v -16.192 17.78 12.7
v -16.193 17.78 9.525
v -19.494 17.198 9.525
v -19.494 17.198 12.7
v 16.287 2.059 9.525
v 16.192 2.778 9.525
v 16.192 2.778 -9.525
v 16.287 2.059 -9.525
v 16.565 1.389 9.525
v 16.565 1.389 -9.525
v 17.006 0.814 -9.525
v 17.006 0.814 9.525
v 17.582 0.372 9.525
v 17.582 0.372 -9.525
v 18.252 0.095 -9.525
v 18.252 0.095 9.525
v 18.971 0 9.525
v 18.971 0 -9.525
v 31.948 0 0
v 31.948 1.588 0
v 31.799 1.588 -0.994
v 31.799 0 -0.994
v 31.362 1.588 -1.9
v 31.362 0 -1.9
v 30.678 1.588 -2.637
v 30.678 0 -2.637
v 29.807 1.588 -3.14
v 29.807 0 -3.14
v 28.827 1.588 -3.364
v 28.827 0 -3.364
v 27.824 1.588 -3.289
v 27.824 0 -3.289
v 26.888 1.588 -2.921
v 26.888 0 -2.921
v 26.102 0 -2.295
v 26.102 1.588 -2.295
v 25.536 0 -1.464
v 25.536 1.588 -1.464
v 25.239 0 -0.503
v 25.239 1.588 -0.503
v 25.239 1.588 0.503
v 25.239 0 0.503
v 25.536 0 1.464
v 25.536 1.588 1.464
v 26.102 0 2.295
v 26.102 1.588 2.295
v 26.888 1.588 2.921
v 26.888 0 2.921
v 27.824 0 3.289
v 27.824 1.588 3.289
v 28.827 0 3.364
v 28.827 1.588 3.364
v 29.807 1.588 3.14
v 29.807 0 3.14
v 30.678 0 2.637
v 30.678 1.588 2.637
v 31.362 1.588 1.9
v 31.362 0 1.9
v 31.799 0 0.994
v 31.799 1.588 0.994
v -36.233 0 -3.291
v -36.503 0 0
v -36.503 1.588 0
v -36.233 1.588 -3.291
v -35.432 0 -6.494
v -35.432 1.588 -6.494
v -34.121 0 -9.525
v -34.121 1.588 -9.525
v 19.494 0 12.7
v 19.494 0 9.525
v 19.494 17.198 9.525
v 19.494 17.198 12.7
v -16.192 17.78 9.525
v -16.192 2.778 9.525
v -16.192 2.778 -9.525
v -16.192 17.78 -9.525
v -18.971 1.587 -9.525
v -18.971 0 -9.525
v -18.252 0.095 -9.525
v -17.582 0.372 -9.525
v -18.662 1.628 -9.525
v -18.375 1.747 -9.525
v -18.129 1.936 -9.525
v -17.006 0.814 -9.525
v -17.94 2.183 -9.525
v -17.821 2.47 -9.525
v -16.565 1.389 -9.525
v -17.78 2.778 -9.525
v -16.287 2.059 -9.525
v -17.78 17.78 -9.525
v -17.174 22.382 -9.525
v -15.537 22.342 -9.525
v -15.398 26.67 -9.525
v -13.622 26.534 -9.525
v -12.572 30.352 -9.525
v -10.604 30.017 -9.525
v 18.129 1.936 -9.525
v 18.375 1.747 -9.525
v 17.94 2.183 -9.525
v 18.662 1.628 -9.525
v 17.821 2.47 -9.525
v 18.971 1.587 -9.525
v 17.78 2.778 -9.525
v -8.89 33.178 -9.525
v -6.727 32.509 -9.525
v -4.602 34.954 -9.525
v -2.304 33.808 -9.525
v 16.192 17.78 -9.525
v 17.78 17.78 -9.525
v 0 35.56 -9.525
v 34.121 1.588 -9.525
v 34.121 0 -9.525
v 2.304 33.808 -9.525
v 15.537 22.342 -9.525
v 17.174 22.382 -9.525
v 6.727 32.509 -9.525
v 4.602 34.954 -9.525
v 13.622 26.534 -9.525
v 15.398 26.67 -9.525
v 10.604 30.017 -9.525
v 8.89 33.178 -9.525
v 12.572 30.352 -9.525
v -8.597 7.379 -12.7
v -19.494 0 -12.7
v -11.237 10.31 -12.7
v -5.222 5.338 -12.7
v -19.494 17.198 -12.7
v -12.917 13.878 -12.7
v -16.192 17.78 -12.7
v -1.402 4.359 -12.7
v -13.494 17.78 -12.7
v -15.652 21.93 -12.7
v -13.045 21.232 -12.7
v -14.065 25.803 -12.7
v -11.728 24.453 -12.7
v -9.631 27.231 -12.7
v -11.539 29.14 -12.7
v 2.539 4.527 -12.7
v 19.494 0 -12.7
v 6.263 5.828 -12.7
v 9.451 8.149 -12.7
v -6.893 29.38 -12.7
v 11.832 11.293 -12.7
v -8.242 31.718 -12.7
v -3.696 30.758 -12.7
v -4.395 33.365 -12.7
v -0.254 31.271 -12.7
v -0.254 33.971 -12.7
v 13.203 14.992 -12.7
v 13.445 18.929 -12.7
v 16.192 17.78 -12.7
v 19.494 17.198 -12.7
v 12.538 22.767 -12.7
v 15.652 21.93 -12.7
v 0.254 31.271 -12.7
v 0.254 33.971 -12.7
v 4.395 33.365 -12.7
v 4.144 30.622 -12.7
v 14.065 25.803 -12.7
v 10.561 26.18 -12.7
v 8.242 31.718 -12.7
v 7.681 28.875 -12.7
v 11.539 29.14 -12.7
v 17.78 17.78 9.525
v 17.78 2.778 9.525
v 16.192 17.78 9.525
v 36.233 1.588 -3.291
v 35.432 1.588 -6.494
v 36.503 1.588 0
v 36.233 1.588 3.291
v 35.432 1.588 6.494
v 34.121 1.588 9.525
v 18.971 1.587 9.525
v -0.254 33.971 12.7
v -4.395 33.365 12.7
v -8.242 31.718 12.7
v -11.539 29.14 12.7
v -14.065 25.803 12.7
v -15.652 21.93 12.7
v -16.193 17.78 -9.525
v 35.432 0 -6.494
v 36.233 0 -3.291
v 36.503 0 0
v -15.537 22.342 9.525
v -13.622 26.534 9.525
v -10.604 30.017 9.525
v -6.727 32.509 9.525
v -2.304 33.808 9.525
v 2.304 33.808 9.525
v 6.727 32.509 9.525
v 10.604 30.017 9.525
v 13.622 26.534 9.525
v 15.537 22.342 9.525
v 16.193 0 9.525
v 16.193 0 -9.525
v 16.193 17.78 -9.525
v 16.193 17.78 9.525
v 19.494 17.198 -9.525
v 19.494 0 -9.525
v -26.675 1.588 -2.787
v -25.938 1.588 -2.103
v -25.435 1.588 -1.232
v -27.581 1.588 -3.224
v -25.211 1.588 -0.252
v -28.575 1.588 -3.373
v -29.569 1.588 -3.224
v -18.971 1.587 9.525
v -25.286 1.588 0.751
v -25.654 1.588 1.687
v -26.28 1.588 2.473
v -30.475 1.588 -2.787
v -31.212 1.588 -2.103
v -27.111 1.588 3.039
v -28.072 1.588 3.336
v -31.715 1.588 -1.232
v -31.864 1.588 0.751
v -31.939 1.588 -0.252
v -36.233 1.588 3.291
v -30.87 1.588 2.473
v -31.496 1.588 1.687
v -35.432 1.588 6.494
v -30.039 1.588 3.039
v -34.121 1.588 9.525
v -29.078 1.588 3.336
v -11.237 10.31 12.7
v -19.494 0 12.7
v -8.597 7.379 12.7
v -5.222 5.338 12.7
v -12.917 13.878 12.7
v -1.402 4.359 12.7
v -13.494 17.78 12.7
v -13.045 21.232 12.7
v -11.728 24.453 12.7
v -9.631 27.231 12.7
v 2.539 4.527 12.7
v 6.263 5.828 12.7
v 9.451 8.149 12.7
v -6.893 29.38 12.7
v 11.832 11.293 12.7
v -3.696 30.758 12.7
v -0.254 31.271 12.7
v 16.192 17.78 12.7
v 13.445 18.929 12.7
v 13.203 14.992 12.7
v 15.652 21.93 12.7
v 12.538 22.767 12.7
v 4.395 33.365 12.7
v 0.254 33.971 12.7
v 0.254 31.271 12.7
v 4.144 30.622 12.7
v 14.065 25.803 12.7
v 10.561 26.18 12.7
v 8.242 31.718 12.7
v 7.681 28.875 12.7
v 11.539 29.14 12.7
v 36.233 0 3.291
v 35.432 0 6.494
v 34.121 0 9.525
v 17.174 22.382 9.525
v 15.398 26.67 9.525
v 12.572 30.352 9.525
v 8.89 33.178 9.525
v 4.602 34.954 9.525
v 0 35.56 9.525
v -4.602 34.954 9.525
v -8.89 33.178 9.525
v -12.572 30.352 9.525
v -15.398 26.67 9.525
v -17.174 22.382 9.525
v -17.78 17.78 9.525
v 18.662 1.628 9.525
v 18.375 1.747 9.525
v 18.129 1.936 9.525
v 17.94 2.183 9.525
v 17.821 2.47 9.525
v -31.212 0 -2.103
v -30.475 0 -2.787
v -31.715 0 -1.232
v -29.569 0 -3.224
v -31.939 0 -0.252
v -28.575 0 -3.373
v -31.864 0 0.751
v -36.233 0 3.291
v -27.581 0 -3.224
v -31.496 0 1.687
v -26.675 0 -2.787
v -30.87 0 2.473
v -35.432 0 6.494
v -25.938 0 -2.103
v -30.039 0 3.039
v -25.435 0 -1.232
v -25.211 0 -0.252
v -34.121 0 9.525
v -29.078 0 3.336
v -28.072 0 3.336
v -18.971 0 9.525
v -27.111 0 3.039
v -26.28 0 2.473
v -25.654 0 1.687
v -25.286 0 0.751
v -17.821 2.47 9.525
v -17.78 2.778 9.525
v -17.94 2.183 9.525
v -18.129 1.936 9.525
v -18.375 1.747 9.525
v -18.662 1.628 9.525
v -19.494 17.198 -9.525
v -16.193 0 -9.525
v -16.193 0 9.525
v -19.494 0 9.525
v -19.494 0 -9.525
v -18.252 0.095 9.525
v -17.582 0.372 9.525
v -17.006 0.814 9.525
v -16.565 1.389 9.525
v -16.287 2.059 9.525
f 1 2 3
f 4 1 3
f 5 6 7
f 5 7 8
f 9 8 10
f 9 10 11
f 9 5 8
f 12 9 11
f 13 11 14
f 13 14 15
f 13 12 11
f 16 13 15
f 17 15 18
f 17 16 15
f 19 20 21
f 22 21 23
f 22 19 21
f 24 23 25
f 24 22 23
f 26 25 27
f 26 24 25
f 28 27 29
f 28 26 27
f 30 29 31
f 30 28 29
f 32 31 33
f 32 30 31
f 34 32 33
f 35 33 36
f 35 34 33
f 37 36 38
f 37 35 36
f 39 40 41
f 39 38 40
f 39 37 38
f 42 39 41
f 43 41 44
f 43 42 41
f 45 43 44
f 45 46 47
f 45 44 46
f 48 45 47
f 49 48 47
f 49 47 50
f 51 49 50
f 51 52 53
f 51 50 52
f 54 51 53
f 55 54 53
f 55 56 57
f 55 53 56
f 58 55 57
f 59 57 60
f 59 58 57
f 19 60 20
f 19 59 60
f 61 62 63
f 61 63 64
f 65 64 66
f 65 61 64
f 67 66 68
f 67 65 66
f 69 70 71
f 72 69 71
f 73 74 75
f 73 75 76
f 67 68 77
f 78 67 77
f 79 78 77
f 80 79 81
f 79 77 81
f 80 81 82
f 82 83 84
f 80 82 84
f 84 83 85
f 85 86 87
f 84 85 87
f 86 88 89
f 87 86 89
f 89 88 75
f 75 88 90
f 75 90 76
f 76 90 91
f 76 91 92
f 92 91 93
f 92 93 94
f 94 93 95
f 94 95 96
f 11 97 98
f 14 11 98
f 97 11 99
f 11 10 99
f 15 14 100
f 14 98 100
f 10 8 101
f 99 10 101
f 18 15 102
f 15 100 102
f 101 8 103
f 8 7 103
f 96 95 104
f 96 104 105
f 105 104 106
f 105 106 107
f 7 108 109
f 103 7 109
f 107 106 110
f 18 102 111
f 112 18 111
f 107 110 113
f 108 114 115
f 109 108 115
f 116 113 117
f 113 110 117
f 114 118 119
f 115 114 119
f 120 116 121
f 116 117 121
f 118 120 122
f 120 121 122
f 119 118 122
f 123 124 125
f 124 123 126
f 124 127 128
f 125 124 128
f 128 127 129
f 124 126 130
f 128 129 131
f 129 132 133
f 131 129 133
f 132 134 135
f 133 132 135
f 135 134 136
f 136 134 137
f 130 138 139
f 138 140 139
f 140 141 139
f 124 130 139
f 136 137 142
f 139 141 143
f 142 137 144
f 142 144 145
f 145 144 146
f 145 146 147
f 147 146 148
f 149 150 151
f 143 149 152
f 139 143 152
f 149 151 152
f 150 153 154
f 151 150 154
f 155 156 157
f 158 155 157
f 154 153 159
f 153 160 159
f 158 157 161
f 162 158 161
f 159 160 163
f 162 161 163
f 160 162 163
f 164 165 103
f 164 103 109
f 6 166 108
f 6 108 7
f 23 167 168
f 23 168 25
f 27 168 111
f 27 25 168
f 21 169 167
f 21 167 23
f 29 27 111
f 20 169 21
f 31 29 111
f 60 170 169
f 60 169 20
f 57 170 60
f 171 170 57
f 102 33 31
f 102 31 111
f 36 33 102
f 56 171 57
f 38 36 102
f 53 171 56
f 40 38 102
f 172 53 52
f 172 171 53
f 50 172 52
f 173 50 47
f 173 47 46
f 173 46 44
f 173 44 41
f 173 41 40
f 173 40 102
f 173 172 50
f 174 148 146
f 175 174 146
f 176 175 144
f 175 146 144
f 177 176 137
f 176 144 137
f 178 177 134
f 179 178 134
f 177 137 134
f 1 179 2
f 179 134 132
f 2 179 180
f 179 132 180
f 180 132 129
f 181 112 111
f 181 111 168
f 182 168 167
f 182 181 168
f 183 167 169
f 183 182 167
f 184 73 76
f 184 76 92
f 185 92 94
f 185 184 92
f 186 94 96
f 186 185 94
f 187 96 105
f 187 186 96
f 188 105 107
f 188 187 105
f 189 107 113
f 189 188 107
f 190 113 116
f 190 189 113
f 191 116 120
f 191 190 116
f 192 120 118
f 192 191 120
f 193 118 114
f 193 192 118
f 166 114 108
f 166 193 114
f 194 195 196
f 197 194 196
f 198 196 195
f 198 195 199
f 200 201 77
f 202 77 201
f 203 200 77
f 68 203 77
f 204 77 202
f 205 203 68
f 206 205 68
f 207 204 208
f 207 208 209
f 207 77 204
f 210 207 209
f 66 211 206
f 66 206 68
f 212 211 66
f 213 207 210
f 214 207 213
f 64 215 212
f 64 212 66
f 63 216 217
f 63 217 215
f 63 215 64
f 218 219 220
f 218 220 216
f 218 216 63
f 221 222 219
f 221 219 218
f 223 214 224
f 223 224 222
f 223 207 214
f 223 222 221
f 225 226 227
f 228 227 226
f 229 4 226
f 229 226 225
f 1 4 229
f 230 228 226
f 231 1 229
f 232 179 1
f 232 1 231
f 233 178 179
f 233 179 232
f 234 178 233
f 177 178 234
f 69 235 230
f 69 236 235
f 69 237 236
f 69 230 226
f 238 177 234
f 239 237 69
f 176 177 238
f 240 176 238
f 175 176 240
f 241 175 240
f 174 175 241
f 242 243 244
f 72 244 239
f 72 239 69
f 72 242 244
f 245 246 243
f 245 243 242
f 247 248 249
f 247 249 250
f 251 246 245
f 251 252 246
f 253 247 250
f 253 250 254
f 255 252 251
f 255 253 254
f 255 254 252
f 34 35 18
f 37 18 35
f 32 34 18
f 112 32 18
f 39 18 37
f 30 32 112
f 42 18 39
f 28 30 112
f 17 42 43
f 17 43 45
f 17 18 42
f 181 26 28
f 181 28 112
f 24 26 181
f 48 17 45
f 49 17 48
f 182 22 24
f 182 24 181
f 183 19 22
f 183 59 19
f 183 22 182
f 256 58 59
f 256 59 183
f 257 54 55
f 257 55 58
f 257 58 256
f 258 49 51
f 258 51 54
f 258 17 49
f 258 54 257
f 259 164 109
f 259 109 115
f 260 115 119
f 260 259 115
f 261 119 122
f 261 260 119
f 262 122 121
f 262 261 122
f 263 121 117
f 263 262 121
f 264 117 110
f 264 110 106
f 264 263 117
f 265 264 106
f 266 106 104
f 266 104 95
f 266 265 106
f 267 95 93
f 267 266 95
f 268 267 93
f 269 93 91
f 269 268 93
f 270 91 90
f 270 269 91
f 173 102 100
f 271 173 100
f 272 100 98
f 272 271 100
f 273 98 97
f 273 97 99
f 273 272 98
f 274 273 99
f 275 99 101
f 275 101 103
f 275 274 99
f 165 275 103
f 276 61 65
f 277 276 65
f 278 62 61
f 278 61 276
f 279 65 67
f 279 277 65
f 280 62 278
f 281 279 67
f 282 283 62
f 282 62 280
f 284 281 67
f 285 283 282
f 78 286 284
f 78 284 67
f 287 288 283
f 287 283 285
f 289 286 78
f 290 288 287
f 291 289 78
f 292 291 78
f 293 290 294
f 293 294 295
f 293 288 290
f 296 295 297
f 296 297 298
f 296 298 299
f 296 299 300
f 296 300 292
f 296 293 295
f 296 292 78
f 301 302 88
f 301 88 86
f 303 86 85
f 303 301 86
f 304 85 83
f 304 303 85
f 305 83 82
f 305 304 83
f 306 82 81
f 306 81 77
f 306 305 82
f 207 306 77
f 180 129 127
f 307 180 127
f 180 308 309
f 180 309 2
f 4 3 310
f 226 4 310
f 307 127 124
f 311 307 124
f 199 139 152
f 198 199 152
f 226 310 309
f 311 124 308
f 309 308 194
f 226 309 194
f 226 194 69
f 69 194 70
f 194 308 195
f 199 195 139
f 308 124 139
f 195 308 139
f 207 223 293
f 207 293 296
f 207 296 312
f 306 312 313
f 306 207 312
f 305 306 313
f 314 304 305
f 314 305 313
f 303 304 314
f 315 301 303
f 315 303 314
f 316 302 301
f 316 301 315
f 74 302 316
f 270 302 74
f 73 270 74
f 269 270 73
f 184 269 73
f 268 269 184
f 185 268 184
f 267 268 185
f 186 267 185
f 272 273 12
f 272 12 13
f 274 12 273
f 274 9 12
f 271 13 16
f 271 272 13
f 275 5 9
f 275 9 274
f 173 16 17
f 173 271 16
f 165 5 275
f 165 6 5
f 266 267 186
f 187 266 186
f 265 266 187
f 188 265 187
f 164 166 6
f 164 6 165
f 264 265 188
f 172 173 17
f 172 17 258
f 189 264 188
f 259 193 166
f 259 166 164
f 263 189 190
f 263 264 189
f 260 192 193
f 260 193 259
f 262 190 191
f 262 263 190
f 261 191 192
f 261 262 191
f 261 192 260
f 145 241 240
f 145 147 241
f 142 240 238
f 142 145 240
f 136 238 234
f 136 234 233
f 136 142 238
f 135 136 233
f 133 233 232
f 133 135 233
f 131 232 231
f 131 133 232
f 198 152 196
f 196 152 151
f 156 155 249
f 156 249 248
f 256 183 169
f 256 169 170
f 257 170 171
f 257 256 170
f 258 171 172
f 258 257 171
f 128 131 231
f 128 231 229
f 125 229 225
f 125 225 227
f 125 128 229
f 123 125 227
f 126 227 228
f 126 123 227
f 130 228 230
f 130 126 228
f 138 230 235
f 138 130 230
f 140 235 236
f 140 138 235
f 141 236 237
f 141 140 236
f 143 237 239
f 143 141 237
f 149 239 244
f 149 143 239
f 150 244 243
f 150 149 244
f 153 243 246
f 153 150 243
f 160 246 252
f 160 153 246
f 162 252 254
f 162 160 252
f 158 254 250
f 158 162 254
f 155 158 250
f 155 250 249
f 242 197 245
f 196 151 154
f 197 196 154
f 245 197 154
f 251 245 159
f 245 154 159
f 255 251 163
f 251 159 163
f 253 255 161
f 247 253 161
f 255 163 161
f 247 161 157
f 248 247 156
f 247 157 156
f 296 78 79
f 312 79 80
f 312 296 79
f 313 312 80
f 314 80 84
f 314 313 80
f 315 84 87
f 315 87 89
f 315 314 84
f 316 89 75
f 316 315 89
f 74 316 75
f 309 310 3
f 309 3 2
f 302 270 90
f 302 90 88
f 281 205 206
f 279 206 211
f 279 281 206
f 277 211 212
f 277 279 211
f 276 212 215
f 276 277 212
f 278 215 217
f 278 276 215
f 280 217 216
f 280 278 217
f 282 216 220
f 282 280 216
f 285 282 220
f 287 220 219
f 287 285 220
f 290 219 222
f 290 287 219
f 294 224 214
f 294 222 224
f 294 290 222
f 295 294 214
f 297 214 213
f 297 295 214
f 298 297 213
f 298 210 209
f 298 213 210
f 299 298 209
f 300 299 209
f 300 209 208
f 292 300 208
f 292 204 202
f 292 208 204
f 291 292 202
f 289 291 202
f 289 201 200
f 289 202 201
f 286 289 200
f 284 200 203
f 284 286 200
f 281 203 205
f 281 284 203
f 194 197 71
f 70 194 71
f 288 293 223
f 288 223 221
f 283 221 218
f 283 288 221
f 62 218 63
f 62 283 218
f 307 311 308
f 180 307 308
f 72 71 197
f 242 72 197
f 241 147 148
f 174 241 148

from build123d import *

# Parameters (mm, degrees)
BOSS_EXTRUDE1_DEPTH      = 9.525
SKETCH2_R                = 3.3734375
CUT_EXTRUDE1_DEPTH       = 52.842814688
BOSS_EXTRUDE2_DEPTH      = 12.7
BOSS_EXTRUDE2_DEPTH_BACK = 12.7
SKETCH3_R                = 13.49375
CUT_EXTRUDE2_START       = -9.525
SKETCH7_W                = 20.310078125
SKETCH7_H                = 17.78
CUT_EXTRUDE2_DEPTH       = 19.05
CUT_EXTRUDE3_DEPTH       = 1.5875
CUT_EXTRUDE4_DEPTH       = 53.518966191
CUT_EXTRUDE4_DEPTH_BACK  = 53.518966191
SKETCH11_W               = 0.508
SKETCH11_H               = 2.7011408


# Read off the part's stored shape, not the designer's step: Cut-Extrude3
with BuildPart() as part:
    # Sketch1 → Boss-Extrude1 (new, symmetric)
    with BuildSketch(Plane.XY):
        with BuildLine():
            Line((-36.502578125, 0), (-18.970625, 0))
            ThreePointArc((-18.970625, 0), (-17.006193974, 0.813693974), (-16.1925, 2.778125))
            Line((-16.1925, 2.778125), (-16.1925, 17.78))
            ThreePointArc((-16.1925, 17.78), (0, 33.9725), (16.1925, 17.78))
            Line((16.1925, 17.78), (16.1925, 2.778125))
            ThreePointArc((16.1925, 2.778125), (17.006193974, 0.813693974), (18.970625, 0))
            Line((18.970625, 0), (36.502578125, 0))
            Line((36.502578125, 0), (36.502578125, 1.5875))
            Line((36.502578125, 1.5875), (18.970625, 1.5875))
            ThreePointArc((18.970625, 1.5875), (18.128725989, 1.936225989), (17.78, 2.778125))
            Line((17.78, 2.778125), (17.78, 17.78))
            ThreePointArc((17.78, 17.78), (0, 35.56), (-17.78, 17.78))
            Line((-17.78, 17.78), (-17.78, 2.778125))
            ThreePointArc((-17.78, 2.778125), (-18.128725989, 1.936225989), (-18.970625, 1.5875))
            Line((-18.970625, 1.5875), (-36.502578125, 1.5875))
            Line((-36.502578125, 1.5875), (-36.502578125, 0))
        make_face()
    extrude(amount=BOSS_EXTRUDE1_DEPTH, both=True)

    # Sketch2 → Cut-Extrude1 (cut, through all)
    with BuildSketch(Plane(origin=(0, 0, 0), x_dir=(1, 0, 0), z_dir=(0, 1, 0))):
        with Locations(Location((-28.575, 0, 0), (0, 0, 90))):
            Circle(SKETCH2_R)
        with Locations((28.575, 0)):
            Circle(SKETCH2_R)
    extrude(amount=CUT_EXTRUDE1_DEPTH, mode=Mode.SUBTRACT)

    # Cut-Extrude3 outline → Cut-Extrude3 (cut)
    with BuildSketch(Plane(origin=(0, 0, 0), x_dir=(1, 0, 0), z_dir=(0, 1, 0))):
        with BuildLine():
            Line((36.502578125, 9.525), (34.121328125, 9.525))
            ThreePointArc((34.121328125, 9.525), (35.898243667, 4.909072636), (36.502578125, 0))
            Line((36.502578125, 0), (36.502578125, 9.525))
        make_face()
        with BuildLine():
            Line((36.502578125, -9.525), (36.502578125, 0))
            ThreePointArc((36.502578125, 0), (35.898243667, -4.909072636), (34.121328125, -9.525))
            Line((34.121328125, -9.525), (36.502578125, -9.525))
        make_face()
        with BuildLine():
            ThreePointArc((-36.502578125, 0), (-35.898243667, 4.909072636), (-34.121328125, 9.525))
            Line((-34.121328125, 9.525), (-36.502578125, 9.525))
            Line((-36.502578125, 9.525), (-36.502578125, 0))
        make_face()
        with BuildLine():
            ThreePointArc((-34.121328125, -9.525), (-35.898243667, -4.909072636), (-36.502578125, 0))
            Line((-36.502578125, 0), (-36.502578125, -9.525))
            Line((-36.502578125, -9.525), (-34.121328125, -9.525))
        make_face()
    extrude(amount=CUT_EXTRUDE3_DEPTH, mode=Mode.SUBTRACT)


with BuildPart() as body_2:
    # Sketch3 → Boss-Extrude2 (new, two sides: drawn at the far end of the back side and taken through both)
    with BuildSketch(Plane.XY.offset(-BOSS_EXTRUDE2_DEPTH_BACK)):
        with BuildLine():
            Line((-19.4945, 0), (19.4945, 0))
            Line((19.4945, 0), (19.4945, 17.19776831))
            Line((19.4945, 17.19776831), (16.1925, 17.78))
            ThreePointArc((16.1925, 17.78), (0, 33.9725), (-16.1925, 17.78))
            Line((-16.1925, 17.78), (-19.4945, 17.19776831))
            Line((-19.4945, 17.19776831), (-19.4945, 0))
        make_face()
        with Locations(Location((0, 17.78, 0), (0, 0, 180))):
            Circle(SKETCH3_R, mode=Mode.SUBTRACT)
    extrude(amount=BOSS_EXTRUDE2_DEPTH + BOSS_EXTRUDE2_DEPTH_BACK)

    # Sketch7 → Cut-Extrude2 (cut)
    with BuildSketch(Plane.XY.offset(CUT_EXTRUDE2_START)):
        with Locations((-26.347539063, 8.89)):
            Rectangle(SKETCH7_W, SKETCH7_H)
        with Locations((26.347539063, 8.89)):
            Rectangle(SKETCH7_W, SKETCH7_H)
    extrude(amount=CUT_EXTRUDE2_DEPTH, mode=Mode.SUBTRACT)

    # Sketch11 → Cut-Extrude4 (cut, two sides: drawn at the far end of the back side and taken through both)
    with BuildSketch(Plane.XY.offset(-CUT_EXTRUDE4_DEPTH_BACK)):
        with Locations((0, 32.6219296)):
            Rectangle(SKETCH11_W, SKETCH11_H)
    extrude(amount=CUT_EXTRUDE4_DEPTH + CUT_EXTRUDE4_DEPTH_BACK, mode=Mode.SUBTRACT)


solid = Compound([part.part, body_2.part])
